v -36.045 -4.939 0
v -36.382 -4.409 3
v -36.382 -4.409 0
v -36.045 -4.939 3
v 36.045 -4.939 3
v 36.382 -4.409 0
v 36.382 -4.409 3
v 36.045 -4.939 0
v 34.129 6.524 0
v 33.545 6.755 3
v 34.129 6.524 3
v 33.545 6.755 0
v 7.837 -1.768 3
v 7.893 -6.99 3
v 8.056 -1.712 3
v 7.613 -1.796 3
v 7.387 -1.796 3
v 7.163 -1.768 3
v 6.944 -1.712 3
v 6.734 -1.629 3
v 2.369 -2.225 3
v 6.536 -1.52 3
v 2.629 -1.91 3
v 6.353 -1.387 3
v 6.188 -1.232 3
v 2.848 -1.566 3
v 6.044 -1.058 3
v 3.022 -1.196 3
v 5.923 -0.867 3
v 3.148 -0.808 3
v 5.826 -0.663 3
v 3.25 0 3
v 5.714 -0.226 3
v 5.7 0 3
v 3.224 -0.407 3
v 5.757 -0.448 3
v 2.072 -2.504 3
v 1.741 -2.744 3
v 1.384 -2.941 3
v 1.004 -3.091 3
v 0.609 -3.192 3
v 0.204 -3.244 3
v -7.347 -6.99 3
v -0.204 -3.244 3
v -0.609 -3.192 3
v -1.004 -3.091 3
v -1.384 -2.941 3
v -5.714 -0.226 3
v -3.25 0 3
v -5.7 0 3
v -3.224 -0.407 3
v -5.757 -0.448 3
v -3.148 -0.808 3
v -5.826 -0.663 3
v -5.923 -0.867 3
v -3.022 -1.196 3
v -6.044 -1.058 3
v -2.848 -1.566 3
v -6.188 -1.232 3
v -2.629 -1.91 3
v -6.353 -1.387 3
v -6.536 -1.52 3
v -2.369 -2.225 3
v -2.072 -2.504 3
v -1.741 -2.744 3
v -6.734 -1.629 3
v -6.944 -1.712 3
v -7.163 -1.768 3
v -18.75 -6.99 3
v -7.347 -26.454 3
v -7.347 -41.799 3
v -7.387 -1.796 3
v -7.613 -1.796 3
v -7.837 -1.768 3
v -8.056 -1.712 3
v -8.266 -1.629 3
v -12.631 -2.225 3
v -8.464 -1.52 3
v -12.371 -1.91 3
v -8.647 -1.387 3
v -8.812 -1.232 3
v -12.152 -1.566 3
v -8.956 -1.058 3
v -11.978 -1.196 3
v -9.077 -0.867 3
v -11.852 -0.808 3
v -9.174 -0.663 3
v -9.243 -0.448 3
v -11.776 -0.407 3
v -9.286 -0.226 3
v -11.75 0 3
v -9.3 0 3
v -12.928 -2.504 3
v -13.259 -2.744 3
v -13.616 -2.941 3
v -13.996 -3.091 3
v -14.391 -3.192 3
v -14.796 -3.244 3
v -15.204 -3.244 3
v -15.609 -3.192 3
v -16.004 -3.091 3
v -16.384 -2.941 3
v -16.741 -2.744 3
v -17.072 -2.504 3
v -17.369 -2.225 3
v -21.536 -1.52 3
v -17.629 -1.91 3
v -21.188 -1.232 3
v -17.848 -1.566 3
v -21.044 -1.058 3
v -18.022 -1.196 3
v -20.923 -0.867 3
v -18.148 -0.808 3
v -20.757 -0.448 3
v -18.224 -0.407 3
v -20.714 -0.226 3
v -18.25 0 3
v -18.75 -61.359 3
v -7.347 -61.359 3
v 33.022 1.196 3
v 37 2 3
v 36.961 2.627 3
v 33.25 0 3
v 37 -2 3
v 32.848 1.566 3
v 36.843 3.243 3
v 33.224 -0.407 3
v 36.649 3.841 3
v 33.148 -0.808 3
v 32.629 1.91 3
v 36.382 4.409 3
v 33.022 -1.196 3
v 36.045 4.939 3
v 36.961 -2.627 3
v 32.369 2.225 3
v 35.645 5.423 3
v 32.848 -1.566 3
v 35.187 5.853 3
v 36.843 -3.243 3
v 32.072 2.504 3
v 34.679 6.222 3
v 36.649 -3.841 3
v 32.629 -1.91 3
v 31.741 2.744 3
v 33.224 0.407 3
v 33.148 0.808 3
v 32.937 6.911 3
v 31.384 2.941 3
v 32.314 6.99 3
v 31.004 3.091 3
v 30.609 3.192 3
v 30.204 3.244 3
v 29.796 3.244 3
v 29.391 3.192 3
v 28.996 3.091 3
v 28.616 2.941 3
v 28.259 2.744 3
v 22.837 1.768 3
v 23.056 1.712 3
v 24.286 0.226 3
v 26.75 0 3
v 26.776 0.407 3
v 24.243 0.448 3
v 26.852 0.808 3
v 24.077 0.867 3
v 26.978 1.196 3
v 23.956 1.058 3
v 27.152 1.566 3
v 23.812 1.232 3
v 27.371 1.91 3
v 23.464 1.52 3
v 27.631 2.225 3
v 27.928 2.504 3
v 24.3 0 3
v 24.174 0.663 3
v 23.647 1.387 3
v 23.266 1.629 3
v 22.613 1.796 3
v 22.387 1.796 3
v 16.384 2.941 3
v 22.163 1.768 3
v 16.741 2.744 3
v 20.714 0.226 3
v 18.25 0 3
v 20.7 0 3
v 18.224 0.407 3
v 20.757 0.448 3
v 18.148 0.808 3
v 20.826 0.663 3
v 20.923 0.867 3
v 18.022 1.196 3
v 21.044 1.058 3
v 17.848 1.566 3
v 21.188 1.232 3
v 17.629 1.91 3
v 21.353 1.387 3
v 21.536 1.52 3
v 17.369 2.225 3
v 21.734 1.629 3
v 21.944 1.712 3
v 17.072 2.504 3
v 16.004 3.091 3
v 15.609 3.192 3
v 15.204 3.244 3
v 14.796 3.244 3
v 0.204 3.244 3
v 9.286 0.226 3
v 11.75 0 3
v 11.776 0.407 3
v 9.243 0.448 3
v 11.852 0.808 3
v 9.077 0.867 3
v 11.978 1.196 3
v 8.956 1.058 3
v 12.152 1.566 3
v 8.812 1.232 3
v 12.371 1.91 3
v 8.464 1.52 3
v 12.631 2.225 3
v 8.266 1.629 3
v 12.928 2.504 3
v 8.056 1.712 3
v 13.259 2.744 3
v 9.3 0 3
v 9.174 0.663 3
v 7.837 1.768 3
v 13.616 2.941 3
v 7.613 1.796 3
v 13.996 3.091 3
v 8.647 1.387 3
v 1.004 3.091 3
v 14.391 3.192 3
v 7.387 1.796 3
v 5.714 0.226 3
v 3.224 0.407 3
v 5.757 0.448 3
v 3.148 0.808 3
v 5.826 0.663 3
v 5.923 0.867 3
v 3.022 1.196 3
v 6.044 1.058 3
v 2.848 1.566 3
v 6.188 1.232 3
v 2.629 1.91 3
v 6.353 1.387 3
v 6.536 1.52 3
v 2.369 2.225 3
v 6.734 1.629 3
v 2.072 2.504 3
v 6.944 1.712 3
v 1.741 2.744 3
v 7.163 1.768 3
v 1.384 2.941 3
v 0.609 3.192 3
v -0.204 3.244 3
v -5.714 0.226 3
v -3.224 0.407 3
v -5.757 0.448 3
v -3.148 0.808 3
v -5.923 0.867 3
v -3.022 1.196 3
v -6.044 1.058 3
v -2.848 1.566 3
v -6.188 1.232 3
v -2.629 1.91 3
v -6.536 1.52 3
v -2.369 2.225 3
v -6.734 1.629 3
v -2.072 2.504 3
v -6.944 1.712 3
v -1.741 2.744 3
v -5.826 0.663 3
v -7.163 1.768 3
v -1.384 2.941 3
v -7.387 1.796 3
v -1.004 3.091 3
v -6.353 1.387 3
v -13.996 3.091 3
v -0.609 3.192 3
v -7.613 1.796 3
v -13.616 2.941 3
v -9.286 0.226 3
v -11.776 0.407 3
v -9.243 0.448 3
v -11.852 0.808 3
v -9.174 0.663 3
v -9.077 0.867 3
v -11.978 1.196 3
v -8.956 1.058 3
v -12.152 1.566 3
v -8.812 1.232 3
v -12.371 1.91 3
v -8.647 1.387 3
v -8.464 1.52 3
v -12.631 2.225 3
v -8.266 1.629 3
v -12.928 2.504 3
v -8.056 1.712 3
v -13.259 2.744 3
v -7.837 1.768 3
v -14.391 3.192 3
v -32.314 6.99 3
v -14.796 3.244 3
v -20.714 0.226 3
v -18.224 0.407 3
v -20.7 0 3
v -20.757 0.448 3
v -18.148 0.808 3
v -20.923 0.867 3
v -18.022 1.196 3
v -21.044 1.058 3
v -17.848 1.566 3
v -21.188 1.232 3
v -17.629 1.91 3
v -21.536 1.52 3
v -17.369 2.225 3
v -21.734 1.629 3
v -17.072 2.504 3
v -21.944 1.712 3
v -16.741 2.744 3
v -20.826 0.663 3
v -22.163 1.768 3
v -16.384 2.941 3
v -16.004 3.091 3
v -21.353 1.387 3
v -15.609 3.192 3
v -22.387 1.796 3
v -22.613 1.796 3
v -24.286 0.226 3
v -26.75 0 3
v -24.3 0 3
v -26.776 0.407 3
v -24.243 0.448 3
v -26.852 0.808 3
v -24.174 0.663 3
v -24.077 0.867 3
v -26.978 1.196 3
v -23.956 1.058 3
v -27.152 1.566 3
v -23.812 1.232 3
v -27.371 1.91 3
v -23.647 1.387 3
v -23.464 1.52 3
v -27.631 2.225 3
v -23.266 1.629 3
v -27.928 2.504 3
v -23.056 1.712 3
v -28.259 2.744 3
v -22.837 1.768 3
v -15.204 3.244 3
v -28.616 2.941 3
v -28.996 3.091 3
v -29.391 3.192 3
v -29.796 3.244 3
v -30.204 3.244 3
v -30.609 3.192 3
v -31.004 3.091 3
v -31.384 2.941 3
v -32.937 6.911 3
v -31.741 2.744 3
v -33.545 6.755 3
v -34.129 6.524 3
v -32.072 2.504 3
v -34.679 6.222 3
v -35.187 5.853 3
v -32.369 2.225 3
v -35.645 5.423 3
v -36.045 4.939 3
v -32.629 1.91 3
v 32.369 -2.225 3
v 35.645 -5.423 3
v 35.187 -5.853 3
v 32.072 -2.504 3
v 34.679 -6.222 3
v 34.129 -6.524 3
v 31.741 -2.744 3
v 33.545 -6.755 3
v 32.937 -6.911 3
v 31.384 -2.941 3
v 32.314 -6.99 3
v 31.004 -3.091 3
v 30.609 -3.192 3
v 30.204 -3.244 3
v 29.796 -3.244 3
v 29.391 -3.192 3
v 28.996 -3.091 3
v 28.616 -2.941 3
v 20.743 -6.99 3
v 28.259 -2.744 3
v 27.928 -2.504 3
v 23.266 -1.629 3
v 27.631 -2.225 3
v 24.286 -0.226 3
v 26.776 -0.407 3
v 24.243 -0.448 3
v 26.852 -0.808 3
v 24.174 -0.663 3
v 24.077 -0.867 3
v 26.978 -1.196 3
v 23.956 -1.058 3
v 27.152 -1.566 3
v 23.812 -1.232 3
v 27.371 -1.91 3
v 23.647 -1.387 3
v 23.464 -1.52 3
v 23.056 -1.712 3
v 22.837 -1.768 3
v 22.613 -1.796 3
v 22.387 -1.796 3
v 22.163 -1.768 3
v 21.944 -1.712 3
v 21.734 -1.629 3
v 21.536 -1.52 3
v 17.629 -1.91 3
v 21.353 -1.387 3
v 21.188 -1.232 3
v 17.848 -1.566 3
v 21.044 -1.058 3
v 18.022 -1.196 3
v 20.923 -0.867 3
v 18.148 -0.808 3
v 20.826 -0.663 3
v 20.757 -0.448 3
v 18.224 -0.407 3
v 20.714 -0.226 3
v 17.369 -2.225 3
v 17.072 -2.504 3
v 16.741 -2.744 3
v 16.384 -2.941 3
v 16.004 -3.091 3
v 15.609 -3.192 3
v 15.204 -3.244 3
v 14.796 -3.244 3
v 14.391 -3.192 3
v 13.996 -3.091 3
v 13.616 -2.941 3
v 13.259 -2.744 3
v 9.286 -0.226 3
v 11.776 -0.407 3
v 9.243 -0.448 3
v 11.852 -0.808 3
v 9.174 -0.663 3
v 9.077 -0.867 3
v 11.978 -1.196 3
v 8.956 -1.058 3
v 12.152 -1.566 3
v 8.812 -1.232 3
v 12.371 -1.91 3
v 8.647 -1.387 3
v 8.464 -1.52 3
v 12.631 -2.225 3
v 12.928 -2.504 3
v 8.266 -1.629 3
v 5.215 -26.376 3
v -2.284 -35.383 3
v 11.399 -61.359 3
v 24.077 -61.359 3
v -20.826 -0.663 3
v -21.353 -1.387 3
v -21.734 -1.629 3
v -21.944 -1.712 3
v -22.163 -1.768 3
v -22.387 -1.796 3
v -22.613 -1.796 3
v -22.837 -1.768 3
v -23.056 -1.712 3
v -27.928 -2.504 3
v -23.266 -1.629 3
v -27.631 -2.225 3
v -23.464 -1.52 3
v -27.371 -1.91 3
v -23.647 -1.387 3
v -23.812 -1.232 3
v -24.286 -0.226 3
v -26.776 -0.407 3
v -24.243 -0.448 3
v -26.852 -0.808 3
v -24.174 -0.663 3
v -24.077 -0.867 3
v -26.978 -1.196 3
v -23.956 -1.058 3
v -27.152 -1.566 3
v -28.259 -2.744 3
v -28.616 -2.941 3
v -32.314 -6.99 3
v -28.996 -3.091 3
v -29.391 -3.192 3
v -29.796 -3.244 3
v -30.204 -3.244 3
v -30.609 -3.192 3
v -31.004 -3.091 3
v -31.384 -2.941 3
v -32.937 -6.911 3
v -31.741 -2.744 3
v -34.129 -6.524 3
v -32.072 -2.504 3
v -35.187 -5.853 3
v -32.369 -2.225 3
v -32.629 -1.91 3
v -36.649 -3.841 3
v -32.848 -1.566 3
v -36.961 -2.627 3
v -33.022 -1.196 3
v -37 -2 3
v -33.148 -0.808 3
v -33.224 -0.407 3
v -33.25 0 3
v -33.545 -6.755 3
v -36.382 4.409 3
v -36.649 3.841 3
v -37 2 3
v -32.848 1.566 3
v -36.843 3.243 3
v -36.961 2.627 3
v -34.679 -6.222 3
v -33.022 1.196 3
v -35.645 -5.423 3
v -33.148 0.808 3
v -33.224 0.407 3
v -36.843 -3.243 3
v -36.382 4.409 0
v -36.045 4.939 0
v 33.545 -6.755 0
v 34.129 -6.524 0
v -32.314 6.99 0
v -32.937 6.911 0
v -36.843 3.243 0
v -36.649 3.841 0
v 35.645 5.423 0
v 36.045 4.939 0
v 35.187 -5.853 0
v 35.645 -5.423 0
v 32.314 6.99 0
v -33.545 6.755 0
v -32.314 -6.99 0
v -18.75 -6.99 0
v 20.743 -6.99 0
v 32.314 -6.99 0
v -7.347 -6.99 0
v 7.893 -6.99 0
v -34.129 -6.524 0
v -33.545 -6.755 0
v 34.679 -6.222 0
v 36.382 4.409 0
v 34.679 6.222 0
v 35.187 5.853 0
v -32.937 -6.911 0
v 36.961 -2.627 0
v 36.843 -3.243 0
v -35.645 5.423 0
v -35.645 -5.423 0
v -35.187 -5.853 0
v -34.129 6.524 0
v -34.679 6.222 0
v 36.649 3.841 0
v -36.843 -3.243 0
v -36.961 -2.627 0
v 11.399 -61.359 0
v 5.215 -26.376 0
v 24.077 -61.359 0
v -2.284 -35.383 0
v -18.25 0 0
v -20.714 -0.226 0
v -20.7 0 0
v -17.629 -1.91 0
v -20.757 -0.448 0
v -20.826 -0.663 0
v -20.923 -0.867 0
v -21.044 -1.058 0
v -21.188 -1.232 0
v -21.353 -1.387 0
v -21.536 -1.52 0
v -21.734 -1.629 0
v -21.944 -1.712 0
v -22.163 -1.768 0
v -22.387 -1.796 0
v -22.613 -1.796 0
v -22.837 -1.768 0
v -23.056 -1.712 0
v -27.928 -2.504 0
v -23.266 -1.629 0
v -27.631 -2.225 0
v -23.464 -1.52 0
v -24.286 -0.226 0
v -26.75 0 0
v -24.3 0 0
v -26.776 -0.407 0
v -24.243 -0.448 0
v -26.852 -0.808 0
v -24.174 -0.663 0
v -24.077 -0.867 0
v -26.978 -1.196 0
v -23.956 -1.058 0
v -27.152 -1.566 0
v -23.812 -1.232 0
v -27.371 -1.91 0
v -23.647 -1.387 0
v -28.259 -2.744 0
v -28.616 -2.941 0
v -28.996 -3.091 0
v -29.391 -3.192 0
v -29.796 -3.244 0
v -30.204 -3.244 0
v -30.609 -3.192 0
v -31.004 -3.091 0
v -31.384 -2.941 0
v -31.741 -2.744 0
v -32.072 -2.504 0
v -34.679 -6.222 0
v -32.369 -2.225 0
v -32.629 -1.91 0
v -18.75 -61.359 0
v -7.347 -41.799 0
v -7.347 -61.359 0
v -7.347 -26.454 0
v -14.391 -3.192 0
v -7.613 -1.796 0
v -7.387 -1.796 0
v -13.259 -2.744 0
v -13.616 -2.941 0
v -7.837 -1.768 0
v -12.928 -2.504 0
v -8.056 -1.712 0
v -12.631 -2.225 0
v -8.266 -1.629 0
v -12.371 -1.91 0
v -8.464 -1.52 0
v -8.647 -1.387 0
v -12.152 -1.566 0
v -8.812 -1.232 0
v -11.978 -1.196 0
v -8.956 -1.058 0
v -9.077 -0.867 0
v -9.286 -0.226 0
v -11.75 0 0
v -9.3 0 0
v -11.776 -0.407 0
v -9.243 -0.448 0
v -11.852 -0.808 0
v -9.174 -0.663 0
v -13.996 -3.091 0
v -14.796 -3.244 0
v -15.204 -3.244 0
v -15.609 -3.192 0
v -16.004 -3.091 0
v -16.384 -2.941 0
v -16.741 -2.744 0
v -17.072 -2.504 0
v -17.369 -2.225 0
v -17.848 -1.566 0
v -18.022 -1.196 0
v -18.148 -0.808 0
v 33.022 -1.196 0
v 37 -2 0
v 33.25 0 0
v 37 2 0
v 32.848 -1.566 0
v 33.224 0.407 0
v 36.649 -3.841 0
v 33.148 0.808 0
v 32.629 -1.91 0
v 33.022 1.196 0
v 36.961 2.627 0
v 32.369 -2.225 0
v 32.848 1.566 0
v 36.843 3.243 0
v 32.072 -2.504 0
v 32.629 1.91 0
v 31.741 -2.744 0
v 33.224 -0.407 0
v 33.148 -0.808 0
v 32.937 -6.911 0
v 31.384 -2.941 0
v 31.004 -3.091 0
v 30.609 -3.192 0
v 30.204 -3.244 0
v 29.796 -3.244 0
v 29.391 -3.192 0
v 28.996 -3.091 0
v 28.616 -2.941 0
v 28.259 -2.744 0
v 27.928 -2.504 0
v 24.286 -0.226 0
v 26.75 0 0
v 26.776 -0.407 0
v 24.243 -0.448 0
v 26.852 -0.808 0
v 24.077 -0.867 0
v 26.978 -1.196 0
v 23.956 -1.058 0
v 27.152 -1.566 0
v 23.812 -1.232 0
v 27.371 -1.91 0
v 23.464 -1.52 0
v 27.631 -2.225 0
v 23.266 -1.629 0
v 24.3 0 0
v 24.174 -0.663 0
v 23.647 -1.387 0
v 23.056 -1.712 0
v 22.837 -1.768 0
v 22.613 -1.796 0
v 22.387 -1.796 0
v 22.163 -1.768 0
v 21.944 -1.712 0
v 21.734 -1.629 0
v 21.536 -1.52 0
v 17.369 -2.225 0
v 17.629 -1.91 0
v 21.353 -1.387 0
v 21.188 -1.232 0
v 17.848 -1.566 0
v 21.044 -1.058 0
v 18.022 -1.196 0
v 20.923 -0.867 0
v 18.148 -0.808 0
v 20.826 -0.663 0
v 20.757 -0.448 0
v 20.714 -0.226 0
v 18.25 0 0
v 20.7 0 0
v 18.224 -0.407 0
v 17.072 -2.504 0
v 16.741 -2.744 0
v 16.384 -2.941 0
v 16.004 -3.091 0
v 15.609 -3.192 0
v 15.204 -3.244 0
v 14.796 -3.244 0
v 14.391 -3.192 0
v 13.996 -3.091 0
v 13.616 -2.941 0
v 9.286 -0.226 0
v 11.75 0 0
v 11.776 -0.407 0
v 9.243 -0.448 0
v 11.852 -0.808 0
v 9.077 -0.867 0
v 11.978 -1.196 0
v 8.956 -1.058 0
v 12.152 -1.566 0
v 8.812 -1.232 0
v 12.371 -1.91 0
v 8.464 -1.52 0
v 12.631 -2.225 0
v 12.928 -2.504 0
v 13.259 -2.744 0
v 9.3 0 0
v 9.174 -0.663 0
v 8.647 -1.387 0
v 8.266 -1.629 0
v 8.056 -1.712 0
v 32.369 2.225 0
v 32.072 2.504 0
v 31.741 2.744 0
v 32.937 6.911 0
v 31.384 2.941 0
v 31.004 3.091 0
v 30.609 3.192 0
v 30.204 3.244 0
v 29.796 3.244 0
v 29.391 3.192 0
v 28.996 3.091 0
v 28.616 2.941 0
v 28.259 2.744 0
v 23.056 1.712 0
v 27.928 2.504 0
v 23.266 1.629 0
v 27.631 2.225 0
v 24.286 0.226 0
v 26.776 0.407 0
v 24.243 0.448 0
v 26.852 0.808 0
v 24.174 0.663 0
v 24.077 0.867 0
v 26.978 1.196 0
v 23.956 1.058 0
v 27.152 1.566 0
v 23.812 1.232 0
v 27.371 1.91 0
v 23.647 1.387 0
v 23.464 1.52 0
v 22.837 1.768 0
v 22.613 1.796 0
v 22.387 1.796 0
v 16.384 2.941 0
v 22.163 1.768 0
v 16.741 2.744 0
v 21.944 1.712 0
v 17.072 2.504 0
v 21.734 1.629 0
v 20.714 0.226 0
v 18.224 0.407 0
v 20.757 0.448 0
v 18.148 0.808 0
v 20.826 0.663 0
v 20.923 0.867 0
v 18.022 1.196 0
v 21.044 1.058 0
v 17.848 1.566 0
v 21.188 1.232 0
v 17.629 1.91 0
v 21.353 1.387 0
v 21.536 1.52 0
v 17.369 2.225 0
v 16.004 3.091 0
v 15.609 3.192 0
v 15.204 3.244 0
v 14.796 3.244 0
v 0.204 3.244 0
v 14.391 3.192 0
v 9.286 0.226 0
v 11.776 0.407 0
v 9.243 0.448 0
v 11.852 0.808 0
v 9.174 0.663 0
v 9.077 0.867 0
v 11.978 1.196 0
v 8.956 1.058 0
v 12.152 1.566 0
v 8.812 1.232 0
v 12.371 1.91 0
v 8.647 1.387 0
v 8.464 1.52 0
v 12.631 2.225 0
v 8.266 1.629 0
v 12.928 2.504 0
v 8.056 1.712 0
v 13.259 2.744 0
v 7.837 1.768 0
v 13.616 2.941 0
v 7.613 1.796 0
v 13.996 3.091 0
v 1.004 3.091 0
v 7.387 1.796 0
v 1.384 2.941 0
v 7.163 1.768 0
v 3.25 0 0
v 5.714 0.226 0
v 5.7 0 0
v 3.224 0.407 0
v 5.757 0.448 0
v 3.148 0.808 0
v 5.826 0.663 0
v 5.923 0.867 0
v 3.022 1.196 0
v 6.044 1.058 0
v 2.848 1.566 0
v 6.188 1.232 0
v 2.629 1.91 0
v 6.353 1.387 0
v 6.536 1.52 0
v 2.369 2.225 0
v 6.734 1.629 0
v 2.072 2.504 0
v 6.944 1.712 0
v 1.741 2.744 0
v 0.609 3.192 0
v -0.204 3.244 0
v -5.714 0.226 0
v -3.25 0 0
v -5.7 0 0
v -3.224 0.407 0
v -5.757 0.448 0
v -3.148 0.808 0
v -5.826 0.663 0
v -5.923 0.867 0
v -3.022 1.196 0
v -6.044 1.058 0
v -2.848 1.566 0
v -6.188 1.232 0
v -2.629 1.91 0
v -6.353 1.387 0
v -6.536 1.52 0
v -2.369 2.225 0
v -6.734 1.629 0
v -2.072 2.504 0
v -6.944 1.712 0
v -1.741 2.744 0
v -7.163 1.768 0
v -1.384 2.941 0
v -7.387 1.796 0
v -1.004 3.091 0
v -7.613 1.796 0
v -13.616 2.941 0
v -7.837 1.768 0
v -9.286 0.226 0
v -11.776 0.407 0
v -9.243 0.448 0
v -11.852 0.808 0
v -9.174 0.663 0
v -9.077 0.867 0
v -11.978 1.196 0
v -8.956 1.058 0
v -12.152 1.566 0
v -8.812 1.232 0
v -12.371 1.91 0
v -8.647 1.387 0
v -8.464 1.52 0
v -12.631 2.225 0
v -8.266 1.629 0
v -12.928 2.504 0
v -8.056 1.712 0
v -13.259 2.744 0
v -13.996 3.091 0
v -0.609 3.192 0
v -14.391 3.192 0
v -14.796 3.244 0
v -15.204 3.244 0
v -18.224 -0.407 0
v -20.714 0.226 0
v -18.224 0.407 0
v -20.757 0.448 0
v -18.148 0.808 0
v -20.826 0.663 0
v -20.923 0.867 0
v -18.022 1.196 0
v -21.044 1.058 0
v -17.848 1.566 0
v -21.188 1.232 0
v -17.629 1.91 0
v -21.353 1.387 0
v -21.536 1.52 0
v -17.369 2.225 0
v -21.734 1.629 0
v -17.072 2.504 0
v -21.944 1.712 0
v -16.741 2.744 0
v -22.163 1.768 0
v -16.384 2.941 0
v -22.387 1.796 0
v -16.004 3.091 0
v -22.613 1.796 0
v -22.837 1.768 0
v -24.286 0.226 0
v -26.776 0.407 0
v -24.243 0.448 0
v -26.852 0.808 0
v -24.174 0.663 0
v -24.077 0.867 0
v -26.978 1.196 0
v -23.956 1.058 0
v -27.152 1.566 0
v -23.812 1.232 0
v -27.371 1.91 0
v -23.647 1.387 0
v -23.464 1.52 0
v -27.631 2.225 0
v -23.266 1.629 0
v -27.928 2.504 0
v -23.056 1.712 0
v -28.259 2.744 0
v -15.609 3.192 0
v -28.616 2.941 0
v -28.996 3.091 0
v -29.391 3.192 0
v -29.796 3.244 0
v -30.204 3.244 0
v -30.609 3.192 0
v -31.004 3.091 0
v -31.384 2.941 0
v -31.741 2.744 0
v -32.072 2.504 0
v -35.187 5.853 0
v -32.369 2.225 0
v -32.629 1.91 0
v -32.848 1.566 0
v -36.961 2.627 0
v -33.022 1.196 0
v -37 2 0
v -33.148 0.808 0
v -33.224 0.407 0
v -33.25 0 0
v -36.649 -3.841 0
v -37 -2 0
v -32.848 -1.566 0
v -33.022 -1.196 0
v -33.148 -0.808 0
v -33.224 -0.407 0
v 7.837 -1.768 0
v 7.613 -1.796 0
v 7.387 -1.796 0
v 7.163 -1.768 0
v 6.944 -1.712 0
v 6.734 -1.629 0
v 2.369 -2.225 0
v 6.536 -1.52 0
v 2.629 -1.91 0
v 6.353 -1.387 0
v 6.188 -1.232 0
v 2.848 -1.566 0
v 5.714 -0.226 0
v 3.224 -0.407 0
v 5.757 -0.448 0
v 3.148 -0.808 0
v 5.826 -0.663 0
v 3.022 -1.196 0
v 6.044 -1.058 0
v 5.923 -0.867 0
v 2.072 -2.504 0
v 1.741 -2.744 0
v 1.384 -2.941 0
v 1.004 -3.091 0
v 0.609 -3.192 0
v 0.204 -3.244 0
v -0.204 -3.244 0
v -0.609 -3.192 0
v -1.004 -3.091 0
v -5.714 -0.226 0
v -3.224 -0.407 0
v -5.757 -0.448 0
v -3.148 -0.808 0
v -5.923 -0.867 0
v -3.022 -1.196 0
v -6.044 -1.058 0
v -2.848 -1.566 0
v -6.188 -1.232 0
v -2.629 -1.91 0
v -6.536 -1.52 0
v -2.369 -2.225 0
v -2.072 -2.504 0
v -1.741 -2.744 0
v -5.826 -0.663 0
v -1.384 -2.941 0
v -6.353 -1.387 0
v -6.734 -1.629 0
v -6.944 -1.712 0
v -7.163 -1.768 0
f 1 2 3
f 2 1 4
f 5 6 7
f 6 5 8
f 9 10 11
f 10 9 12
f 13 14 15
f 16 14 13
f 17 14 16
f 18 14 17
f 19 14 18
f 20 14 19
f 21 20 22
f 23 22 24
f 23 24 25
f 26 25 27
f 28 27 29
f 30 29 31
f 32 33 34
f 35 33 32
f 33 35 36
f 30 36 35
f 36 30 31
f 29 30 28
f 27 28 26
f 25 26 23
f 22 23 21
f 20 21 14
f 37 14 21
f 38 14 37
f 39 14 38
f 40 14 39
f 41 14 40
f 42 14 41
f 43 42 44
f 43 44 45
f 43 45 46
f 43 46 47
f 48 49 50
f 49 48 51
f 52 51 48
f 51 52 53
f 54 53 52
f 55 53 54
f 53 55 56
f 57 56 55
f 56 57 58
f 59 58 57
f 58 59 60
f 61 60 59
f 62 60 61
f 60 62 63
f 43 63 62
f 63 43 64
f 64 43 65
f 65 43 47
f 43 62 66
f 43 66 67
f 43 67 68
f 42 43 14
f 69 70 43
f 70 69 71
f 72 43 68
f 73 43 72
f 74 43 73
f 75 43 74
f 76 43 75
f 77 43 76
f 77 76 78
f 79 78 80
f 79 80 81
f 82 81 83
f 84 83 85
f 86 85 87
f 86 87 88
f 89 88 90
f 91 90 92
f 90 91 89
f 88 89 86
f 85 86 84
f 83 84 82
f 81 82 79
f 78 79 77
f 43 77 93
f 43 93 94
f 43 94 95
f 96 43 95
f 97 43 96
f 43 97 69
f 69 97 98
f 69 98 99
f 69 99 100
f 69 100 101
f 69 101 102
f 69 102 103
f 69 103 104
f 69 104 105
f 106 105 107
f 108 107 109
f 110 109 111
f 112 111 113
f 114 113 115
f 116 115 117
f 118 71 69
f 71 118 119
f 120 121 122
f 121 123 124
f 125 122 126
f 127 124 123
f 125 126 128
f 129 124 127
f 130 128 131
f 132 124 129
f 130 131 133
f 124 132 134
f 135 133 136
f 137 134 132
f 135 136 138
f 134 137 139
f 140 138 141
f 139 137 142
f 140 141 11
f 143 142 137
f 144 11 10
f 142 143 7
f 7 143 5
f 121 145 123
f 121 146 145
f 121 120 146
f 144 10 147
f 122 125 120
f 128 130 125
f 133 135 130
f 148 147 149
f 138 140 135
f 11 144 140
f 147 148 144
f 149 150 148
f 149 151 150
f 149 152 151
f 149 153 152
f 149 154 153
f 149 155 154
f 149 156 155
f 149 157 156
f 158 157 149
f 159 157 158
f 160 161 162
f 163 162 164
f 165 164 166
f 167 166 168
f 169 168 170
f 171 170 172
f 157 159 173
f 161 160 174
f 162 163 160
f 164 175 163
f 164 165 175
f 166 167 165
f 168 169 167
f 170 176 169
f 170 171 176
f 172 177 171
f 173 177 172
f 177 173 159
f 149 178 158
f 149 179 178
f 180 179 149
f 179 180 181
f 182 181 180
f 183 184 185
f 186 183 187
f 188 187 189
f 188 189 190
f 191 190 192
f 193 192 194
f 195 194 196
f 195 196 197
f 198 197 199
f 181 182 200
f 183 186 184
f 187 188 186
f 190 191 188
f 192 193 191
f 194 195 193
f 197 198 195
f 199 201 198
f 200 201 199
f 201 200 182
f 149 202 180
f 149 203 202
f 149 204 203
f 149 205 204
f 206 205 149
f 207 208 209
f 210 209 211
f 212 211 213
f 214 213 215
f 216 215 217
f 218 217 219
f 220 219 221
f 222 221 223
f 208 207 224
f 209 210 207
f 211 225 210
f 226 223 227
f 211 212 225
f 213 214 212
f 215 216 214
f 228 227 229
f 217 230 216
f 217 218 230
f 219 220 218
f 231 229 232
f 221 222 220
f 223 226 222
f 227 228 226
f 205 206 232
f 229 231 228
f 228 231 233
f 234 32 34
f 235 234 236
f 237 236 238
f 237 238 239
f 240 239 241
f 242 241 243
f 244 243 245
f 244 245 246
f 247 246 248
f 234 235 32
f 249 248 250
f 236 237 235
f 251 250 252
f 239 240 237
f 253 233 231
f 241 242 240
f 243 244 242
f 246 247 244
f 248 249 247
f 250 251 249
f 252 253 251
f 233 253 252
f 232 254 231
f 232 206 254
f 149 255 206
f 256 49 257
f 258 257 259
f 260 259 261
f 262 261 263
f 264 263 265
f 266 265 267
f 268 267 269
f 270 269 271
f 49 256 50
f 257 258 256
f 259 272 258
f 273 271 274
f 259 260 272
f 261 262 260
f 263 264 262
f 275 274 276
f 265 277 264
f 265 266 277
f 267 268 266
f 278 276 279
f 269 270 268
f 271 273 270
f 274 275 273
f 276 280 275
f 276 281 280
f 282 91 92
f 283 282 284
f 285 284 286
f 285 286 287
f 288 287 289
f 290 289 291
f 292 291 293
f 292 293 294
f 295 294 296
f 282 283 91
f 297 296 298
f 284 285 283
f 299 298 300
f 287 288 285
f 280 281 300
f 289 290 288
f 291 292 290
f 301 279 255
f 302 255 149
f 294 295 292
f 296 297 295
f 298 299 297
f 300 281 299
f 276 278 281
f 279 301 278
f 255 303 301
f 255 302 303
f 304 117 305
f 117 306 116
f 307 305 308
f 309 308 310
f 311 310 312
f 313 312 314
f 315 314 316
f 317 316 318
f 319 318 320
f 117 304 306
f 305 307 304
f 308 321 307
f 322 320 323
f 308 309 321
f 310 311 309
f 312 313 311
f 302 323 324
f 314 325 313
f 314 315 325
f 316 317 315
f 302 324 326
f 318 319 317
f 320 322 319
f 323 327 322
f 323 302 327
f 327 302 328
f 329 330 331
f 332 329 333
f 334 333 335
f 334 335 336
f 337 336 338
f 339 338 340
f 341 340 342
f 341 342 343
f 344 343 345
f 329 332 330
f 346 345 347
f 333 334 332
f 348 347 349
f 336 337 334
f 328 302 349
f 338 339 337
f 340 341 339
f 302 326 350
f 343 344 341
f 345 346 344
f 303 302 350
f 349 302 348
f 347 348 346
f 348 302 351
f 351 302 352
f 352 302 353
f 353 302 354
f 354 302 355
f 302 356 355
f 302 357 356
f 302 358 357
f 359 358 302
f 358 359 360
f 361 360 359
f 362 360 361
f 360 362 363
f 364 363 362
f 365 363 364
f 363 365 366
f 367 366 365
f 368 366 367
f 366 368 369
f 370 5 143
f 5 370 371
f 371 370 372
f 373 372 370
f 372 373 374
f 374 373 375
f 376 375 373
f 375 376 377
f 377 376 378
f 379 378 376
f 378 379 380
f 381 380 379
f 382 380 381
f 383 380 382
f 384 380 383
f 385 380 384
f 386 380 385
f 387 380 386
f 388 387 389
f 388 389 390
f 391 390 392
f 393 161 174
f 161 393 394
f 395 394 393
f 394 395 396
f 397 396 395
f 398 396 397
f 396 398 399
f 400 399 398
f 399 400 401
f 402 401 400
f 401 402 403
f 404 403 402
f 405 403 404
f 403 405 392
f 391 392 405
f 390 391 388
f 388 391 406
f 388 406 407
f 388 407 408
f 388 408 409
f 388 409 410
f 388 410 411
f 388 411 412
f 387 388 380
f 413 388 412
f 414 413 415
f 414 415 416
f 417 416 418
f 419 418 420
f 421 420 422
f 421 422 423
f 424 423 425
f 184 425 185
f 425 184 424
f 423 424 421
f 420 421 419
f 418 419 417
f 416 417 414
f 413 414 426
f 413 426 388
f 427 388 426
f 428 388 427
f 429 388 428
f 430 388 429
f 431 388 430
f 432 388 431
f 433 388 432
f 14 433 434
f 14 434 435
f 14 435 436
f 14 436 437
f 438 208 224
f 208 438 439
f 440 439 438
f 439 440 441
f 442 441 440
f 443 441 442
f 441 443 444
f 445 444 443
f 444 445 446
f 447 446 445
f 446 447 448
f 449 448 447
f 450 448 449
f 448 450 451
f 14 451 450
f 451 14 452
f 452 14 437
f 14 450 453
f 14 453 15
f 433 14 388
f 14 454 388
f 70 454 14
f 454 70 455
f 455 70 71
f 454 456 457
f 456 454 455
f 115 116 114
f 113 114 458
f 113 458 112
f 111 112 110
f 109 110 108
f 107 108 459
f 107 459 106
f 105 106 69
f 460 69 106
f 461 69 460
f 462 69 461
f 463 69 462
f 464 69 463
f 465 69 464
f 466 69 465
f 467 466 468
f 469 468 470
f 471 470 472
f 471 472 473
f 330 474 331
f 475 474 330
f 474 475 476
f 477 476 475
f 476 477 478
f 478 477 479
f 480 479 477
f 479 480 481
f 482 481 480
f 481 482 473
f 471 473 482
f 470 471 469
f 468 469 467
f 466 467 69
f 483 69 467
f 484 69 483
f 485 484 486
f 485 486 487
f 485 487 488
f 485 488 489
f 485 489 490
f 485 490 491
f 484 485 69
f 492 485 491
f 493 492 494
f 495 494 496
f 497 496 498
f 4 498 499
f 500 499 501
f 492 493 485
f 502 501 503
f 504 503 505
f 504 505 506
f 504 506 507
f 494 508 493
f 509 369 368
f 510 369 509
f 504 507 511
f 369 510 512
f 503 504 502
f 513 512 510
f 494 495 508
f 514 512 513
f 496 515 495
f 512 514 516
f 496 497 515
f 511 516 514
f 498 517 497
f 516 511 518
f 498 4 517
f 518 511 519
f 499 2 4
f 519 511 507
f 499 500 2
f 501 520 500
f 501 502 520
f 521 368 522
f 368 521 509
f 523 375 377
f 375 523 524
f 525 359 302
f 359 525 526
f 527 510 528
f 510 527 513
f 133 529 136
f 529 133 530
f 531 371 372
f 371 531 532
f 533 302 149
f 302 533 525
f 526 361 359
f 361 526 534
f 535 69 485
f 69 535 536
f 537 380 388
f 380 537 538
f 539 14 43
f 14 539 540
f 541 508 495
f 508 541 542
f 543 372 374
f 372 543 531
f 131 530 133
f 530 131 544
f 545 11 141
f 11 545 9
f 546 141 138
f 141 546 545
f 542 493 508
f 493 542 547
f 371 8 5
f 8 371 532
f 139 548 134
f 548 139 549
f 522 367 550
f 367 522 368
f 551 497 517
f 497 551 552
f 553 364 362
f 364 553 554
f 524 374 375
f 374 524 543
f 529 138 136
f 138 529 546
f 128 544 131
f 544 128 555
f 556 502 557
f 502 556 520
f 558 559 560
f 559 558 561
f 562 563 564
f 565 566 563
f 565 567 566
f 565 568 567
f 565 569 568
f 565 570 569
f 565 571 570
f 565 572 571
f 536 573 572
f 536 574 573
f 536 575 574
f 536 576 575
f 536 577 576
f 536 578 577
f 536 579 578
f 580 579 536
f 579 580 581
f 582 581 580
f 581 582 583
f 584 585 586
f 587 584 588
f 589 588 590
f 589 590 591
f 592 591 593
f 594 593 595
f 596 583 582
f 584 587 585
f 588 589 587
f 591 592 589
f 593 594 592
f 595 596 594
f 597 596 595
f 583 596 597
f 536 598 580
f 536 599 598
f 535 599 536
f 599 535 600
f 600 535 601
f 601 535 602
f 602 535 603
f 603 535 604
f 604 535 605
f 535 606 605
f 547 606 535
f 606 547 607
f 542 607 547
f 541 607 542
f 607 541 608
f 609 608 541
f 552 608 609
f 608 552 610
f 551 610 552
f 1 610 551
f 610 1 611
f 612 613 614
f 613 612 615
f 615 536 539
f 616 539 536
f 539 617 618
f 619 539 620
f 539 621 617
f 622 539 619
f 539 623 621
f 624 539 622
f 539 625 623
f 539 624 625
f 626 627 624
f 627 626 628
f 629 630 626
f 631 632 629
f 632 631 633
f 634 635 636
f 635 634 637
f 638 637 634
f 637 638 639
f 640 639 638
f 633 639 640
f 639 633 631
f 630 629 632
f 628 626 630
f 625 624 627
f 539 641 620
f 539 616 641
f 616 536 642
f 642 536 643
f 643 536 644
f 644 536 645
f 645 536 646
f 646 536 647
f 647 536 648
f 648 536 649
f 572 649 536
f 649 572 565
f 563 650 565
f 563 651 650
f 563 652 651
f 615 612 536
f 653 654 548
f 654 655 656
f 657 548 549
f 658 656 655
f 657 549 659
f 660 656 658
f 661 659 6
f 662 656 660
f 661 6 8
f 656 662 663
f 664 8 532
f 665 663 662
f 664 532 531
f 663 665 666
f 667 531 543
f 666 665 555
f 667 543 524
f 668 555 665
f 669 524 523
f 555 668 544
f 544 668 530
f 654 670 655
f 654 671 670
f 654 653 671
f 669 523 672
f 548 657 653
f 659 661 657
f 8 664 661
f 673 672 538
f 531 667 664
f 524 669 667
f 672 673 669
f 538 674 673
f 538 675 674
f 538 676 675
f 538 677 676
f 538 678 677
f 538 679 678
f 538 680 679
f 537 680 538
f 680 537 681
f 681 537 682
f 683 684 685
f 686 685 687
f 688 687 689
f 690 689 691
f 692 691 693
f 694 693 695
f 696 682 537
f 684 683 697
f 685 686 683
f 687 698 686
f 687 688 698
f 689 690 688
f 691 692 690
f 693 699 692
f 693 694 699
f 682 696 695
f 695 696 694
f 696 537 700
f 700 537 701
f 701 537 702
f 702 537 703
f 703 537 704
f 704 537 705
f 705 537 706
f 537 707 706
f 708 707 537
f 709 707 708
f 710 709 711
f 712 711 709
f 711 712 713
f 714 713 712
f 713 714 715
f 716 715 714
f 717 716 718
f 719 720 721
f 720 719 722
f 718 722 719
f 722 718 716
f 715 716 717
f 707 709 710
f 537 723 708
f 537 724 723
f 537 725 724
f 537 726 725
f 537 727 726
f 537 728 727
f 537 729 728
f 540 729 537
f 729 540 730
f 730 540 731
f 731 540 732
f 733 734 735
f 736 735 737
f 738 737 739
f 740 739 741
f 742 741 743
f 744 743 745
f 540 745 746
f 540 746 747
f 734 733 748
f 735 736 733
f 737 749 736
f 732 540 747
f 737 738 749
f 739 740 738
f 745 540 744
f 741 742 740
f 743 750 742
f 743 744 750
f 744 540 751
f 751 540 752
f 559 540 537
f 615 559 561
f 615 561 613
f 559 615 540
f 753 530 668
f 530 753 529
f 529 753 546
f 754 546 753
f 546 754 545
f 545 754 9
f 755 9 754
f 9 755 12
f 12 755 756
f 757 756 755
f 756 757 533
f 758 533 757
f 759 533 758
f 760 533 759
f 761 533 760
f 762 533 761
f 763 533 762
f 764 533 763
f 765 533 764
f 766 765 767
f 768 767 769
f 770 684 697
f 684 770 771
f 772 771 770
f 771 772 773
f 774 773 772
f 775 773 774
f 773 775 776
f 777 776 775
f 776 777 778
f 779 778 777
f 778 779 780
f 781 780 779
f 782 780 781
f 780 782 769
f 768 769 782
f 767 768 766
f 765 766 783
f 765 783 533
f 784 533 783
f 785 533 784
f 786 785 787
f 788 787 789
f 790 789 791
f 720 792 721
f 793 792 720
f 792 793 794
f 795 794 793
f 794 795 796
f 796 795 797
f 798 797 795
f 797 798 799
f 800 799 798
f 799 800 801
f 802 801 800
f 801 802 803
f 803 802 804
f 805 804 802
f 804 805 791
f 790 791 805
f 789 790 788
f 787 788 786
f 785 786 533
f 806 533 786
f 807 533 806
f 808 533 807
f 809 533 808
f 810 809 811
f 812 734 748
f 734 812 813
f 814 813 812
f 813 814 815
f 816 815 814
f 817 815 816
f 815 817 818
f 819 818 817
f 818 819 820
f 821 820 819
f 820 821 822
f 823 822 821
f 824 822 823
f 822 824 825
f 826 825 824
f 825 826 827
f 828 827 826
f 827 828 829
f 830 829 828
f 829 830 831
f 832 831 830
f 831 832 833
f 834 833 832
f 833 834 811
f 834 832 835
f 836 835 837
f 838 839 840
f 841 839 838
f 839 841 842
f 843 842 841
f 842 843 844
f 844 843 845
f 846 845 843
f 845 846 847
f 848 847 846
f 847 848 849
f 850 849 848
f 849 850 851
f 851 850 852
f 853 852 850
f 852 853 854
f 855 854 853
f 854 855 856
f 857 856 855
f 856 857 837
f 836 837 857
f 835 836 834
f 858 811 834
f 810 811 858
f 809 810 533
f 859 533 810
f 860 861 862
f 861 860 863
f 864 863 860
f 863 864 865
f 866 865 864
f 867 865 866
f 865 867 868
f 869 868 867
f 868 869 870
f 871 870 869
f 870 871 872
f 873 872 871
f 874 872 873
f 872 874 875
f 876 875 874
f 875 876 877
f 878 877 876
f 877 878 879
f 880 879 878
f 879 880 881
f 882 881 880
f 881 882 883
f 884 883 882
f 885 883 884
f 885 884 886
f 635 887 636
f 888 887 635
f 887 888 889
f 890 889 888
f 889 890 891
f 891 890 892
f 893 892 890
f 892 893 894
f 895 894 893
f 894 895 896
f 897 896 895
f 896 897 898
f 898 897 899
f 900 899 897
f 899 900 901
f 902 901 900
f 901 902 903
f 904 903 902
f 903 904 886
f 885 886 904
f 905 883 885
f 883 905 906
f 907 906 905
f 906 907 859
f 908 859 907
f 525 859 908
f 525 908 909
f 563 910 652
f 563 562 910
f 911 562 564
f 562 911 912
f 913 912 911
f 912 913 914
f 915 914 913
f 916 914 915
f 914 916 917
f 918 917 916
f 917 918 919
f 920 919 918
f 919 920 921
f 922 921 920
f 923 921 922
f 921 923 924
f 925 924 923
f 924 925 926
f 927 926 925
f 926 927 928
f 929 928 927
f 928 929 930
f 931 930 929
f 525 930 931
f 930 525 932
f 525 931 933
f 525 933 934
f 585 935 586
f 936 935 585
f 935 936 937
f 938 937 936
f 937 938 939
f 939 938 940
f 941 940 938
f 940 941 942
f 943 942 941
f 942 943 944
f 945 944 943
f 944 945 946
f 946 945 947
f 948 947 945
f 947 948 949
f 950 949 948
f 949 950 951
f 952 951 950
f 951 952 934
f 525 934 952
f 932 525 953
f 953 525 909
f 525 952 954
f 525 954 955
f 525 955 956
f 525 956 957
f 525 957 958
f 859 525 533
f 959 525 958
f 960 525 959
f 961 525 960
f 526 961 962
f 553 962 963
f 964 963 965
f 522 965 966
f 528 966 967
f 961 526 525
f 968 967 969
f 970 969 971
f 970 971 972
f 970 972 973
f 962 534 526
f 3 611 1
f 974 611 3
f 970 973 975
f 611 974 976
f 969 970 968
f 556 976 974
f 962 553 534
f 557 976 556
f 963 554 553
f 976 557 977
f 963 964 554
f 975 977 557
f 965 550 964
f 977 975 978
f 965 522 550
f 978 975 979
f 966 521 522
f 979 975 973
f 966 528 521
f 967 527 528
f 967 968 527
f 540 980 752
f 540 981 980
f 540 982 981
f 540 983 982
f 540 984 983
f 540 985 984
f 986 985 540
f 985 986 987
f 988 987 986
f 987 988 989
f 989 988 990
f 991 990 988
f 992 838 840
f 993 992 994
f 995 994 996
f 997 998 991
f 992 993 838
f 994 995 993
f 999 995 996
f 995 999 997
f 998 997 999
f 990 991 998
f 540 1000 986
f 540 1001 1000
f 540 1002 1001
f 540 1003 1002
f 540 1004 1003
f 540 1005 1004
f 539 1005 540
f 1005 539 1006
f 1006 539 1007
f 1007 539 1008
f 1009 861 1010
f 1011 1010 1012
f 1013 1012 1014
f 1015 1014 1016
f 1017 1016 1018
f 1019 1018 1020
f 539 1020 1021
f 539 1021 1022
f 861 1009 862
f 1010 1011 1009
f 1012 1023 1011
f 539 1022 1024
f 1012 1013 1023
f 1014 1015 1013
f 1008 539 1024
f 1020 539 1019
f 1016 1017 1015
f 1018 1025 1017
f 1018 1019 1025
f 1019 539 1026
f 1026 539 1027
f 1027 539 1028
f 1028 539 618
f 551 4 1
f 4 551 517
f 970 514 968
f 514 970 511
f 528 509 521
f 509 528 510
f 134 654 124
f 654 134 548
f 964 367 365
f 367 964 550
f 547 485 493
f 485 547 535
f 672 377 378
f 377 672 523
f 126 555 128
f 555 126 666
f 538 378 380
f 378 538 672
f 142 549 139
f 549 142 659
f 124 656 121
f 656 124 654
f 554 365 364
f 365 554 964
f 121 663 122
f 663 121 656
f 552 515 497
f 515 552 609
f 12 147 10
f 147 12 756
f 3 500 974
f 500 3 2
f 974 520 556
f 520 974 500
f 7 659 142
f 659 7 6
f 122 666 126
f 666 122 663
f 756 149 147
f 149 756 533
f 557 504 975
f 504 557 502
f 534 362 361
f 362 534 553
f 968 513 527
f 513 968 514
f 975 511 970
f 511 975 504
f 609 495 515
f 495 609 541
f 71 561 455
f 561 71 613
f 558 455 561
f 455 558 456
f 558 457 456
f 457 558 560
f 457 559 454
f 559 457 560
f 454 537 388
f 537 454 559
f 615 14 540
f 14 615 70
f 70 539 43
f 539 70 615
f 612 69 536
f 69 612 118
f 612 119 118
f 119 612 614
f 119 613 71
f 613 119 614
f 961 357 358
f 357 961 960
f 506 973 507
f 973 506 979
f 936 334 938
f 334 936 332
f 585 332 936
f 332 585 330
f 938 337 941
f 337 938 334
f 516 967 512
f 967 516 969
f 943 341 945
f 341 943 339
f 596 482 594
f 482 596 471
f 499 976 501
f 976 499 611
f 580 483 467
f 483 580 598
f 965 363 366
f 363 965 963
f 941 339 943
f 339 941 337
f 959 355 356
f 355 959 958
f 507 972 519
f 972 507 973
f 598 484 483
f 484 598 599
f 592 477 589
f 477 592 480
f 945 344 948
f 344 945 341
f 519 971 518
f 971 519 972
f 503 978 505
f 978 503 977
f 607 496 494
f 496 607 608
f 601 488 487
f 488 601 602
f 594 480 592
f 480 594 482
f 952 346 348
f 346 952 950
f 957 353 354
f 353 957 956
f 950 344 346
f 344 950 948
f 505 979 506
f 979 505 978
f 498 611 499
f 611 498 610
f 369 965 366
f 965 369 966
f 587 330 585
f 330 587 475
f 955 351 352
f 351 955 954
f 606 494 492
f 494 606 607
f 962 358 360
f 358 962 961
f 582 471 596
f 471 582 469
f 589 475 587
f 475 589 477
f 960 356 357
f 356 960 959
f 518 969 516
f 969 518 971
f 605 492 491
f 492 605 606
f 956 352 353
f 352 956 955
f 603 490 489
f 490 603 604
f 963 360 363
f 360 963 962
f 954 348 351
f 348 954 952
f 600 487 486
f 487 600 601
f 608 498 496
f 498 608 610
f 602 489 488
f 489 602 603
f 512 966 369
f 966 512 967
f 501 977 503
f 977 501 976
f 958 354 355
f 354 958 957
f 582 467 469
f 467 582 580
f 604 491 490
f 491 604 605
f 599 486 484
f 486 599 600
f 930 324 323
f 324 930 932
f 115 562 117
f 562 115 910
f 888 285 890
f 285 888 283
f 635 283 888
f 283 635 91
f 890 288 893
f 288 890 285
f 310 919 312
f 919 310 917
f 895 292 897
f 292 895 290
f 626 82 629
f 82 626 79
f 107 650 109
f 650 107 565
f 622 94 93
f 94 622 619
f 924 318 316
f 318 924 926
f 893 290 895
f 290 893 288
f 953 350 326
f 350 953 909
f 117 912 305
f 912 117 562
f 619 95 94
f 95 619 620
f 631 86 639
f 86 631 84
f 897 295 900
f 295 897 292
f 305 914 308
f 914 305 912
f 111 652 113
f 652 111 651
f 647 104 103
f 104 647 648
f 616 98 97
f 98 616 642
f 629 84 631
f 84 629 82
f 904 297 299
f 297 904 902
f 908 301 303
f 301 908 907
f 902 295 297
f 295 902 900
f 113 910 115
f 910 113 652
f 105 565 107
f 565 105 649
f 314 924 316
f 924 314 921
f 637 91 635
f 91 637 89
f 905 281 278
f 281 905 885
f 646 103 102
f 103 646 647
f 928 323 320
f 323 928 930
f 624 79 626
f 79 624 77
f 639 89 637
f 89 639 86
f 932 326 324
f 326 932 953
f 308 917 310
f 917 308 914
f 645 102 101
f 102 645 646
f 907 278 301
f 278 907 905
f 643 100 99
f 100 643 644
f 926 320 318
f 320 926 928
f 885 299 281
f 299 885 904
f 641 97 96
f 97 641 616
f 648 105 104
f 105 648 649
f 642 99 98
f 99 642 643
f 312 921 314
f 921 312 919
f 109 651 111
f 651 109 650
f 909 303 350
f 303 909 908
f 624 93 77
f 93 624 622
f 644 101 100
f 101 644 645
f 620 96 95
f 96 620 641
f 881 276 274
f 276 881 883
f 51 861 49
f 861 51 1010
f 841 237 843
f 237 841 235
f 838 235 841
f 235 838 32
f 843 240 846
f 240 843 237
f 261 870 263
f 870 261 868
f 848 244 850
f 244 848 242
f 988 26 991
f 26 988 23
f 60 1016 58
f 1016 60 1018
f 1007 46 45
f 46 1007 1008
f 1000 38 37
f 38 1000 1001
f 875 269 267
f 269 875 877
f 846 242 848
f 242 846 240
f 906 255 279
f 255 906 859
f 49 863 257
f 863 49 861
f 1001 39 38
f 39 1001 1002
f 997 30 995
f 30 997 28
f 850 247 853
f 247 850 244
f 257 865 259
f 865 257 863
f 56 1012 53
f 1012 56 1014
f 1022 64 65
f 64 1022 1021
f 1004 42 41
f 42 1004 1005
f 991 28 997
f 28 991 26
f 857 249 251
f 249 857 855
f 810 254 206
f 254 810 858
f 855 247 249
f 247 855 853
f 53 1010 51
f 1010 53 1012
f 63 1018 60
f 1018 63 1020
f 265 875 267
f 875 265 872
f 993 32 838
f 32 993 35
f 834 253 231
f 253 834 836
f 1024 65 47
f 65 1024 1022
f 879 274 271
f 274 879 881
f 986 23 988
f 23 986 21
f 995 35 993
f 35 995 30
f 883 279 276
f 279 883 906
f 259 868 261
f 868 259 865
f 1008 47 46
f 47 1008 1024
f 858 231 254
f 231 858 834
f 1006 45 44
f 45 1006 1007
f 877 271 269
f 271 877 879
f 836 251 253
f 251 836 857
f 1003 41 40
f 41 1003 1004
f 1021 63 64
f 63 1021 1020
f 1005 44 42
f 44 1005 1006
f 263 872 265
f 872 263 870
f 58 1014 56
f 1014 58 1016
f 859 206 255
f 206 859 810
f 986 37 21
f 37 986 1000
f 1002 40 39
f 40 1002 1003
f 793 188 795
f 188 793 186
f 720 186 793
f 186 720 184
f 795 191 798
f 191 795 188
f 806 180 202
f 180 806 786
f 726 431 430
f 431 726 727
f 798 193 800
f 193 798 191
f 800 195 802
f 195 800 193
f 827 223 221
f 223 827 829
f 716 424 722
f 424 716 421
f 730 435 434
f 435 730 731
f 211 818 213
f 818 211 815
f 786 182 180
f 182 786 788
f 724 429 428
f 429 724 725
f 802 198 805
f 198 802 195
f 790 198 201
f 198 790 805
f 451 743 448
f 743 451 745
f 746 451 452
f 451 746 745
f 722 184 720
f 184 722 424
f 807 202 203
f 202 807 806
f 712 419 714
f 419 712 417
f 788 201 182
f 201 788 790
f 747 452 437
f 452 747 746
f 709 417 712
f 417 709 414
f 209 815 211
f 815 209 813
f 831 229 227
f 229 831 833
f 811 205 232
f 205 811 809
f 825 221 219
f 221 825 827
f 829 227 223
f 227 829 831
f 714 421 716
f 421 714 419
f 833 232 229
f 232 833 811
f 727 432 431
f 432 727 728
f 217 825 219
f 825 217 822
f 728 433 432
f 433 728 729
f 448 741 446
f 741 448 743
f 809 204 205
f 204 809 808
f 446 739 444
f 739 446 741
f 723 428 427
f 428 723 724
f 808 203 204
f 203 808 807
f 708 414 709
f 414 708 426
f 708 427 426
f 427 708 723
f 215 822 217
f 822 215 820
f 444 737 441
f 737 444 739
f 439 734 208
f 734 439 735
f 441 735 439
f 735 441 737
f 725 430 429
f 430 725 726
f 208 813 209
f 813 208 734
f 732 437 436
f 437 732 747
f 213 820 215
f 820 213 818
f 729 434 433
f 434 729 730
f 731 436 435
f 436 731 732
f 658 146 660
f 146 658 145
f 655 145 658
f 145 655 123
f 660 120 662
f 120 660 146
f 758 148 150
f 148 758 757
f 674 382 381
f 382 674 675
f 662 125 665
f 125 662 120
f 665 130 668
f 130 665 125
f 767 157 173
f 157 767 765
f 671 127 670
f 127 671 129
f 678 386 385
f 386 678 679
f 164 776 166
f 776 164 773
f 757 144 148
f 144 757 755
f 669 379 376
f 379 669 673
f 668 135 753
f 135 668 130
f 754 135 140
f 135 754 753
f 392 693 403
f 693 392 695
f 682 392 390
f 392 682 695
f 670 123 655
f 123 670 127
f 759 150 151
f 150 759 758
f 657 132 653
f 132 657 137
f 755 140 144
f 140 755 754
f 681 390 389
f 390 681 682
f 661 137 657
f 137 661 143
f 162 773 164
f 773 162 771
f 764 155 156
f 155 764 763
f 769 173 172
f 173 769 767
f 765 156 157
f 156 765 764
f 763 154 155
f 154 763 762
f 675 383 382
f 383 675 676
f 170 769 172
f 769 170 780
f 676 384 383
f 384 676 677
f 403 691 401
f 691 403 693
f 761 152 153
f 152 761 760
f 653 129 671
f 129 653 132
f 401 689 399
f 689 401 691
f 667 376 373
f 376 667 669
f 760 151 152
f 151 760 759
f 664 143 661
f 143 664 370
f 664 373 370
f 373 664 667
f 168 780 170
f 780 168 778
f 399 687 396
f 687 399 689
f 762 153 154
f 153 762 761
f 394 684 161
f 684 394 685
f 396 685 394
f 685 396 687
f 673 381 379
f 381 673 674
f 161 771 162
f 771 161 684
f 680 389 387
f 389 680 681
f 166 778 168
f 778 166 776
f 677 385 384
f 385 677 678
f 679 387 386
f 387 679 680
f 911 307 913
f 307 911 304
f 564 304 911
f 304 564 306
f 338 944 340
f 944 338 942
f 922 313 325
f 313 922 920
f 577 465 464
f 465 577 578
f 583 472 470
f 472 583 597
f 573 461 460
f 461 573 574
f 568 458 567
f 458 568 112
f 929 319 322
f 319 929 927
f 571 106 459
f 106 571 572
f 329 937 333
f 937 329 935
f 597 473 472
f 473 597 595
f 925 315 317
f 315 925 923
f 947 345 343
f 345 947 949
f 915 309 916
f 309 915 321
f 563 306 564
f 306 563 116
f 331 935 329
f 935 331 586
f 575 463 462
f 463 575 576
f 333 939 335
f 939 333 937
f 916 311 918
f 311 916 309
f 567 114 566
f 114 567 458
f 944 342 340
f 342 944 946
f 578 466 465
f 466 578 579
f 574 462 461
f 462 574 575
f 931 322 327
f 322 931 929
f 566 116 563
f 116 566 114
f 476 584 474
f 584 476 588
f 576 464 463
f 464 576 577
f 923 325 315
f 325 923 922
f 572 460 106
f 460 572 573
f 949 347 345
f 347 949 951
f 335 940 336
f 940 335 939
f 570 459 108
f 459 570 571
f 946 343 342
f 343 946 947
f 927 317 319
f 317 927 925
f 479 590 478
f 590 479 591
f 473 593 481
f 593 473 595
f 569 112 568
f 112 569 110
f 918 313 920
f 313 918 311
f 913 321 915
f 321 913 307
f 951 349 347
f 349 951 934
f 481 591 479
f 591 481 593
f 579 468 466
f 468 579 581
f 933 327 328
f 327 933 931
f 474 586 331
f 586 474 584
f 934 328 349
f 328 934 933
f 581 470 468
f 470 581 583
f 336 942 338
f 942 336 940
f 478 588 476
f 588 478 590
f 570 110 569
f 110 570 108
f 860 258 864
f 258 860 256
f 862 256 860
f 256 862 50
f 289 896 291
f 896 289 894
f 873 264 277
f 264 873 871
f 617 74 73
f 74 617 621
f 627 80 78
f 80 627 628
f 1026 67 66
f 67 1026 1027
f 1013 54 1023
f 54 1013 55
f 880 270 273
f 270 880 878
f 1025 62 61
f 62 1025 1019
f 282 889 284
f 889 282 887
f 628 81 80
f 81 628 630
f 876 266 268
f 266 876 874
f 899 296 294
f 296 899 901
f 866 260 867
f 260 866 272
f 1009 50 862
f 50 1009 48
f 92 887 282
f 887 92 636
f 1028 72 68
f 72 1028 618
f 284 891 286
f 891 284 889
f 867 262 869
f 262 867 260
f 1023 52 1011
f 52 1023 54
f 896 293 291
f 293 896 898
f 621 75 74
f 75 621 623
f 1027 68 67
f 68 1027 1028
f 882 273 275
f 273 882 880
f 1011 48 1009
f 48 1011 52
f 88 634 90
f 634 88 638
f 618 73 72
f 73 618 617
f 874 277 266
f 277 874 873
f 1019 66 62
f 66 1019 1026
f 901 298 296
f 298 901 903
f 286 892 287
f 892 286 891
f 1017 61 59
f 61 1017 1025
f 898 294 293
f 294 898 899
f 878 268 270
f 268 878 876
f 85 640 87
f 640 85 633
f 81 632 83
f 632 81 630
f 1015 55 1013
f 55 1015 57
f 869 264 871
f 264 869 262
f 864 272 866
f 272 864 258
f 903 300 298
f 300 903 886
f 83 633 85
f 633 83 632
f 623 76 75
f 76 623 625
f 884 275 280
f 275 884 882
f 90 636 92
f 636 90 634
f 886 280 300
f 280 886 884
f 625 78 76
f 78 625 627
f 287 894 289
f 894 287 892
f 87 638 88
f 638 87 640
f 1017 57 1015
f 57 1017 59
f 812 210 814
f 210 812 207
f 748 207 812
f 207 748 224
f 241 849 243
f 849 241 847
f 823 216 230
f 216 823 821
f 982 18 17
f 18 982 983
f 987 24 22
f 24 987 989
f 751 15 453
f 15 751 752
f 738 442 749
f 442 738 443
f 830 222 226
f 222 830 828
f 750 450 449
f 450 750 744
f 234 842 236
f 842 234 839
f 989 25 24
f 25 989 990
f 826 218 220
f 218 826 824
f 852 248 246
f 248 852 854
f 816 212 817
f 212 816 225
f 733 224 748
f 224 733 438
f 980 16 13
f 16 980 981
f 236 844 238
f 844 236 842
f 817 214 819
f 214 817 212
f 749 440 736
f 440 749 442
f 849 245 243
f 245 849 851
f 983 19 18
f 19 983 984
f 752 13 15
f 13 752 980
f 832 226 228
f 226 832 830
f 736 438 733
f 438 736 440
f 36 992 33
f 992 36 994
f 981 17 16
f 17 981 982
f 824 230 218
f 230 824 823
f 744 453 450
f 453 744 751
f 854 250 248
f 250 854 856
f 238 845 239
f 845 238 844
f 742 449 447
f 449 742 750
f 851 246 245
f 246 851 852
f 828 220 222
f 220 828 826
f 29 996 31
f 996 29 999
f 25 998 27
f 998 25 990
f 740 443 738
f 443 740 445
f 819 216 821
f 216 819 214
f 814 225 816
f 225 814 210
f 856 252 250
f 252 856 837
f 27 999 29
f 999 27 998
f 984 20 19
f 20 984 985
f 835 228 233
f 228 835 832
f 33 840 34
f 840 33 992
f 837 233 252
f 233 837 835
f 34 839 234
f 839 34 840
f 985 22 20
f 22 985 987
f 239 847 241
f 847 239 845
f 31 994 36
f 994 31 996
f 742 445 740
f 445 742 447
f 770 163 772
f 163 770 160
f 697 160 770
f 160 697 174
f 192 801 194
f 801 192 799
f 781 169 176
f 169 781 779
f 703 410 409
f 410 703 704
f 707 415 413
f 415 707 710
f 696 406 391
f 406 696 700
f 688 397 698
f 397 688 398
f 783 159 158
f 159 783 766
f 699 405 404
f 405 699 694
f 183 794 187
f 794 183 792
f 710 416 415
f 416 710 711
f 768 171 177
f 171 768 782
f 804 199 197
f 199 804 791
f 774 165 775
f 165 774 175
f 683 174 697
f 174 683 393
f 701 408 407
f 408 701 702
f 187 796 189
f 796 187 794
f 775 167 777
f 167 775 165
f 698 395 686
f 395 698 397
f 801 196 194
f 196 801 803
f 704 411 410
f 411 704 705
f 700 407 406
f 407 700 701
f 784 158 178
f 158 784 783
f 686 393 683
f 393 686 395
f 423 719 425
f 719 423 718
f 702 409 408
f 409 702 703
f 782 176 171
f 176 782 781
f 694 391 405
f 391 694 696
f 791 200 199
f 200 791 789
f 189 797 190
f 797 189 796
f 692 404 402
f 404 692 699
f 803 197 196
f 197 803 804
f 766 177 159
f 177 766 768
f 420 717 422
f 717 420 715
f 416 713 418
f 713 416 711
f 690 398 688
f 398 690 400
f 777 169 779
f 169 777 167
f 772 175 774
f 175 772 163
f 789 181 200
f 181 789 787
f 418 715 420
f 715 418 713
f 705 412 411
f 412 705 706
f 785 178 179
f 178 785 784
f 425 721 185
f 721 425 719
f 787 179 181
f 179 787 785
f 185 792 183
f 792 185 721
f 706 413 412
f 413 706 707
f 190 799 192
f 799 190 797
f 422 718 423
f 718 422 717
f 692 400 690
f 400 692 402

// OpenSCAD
$fn = 50;


difference() {
	union() {
		hull() {
			translate(v = [-32.0000000000, 2.0000000000, 0]) {
				cylinder(h = 3, r = 5);
			}
			translate(v = [32.0000000000, 2.0000000000, 0]) {
				cylinder(h = 3, r = 5);
			}
			translate(v = [-32.0000000000, -2.0000000000, 0]) {
				cylinder(h = 3, r = 5);
			}
			translate(v = [32.0000000000, -2.0000000000, 0]) {
				cylinder(h = 3, r = 5);
			}
		}
		translate(v = [0, -5, 0]) {
			linear_extrude(height = 3) {
				text(font = "DejaVu Sans Mono:style=Bold", halign = "center", size = 57.0000000000, text = "K", valign = "top");
			}
		}
	}
	union() {
		translate(v = [-30.0000000000, 0.0000000000, 0]) {
			translate(v = [0, 0, -100]) {
				cylinder(h = 200, r = 3.2500000000);
			}
		}
		translate(v = [-15.0000000000, 0.0000000000, 0]) {
			translate(v = [0, 0, -100]) {
				cylinder(h = 200, r = 3.2500000000);
			}
		}
		translate(v = [0, 0, -100]) {
			cylinder(h = 200, r = 3.2500000000);
		}
		translate(v = [15.0000000000, 0.0000000000, 0]) {
			translate(v = [0, 0, -100]) {
				cylinder(h = 200, r = 3.2500000000);
			}
		}
		translate(v = [30.0000000000, 0.0000000000, 0]) {
			translate(v = [0, 0, -100]) {
				cylinder(h = 200, r = 3.2500000000);
			}
		}
		translate(v = [-30.0000000000, 0.0000000000, 0]) {
			translate(v = [0, 0, -100]) {
				cylinder(h = 200, r = 1.8000000000);
			}
		}
		translate(v = [-22.5000000000, 0.0000000000, 0]) {
			translate(v = [0, 0, -100]) {
				cylinder(h = 200, r = 1.8000000000);
			}
		}
		translate(v = [-15.0000000000, 0.0000000000, 0]) {
			translate(v = [0, 0, -100]) {
				cylinder(h = 200, r = 1.8000000000);
			}
		}
		translate(v = [-7.5000000000, 0.0000000000, 0]) {
			translate(v = [0, 0, -100]) {
				cylinder(h = 200, r = 1.8000000000);
			}
		}
		translate(v = [0, 0, -100]) {
			cylinder(h = 200, r = 1.8000000000);
		}
		translate(v = [7.5000000000, 0.0000000000, 0]) {
			translate(v = [0, 0, -100]) {
				cylinder(h = 200, r = 1.8000000000);
			}
		}
		translate(v = [15.0000000000, 0.0000000000, 0]) {
			translate(v = [0, 0, -100]) {
				cylinder(h = 200, r = 1.8000000000);
			}
		}
		translate(v = [22.5000000000, 0.0000000000, 0]) {
			translate(v = [0, 0, -100]) {
				cylinder(h = 200, r = 1.8000000000);
			}
		}
		translate(v = [30.0000000000, 0.0000000000, 0]) {
			translate(v = [0, 0, -100]) {
				cylinder(h = 200, r = 1.8000000000);
			}
		}
	}
}
